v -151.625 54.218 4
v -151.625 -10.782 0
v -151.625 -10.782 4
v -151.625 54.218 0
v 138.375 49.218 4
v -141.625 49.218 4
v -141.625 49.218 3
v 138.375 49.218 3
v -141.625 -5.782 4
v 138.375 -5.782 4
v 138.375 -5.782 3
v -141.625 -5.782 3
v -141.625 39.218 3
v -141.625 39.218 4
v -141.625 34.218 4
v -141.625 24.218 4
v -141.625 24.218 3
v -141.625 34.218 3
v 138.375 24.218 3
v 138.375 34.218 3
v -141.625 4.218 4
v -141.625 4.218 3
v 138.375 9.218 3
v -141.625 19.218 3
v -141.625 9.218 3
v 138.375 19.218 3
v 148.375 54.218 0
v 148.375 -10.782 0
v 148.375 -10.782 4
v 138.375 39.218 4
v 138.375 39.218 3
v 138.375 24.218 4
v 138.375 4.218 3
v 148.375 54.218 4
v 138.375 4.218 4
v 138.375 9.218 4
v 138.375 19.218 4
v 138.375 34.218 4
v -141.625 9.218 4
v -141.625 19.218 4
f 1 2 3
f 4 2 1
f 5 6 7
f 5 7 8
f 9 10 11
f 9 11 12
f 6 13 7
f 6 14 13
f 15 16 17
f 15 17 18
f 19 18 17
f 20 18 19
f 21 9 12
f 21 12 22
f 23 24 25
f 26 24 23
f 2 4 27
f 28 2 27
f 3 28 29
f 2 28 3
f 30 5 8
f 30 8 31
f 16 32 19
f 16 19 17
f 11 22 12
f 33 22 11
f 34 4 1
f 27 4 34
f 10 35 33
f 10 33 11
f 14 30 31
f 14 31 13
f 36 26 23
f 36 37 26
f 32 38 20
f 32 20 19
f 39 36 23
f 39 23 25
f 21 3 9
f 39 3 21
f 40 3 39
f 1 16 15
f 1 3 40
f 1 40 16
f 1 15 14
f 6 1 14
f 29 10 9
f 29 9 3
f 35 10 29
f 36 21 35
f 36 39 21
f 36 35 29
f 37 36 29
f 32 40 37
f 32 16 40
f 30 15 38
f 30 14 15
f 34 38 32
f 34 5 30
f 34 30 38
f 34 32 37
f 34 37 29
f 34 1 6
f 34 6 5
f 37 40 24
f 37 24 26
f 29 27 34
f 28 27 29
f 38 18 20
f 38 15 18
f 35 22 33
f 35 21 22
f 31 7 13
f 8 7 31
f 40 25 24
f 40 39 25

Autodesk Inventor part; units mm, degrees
ref_plane "YZ Plane" through (0, 0, 0) normal (1, 0, 0) x (0, 1, 0)
ref_plane "XZ Plane" through (0, 0, 0) normal (0, 1, 0) x (-1, 0, 0)
ref_plane "XY Plane" through (0, 0, 0) normal (0, 0, 1) x (1, 0, 0)
sketch "Esquisse1" plane through (0, 0, 0) normal (0, 0, 1) x (1, 0, 0)
  line L0 (-151.6254, 54.2183) -> (148.3746, 54.2183)
  line L1 (148.3746, 54.2183) -> (148.3746, -10.7817)
  line L2 (148.3746, -10.7817) -> (-151.6254, -10.7817)
  line L3 (-151.6254, -10.7817) -> (-151.6254, 54.2183)
  point P0 (0, 0)
  dimension "d0" = 300
  dimension "d1" = 65
extrude "Extrusion1" add sketch "Esquisse1" along normal blind 4
sketch "Esquisse2" plane through (0, 0, 4) normal (0, 0, 1) x (1, 0, 0)
  line L0 (-141.6254, 49.2183) -> (138.3746, 49.2183)
  line L1 (138.3746, 49.2183) -> (138.3746, 39.2183)
  line L2 (138.3746, 39.2183) -> (-141.6254, 39.2183)
  line L3 (-141.6254, 39.2183) -> (-141.6254, 49.2183)
  line L4 (-141.6254, 34.2183) -> (138.3746, 34.2183)
  line L5 (138.3746, 34.2183) -> (138.3746, 24.2183)
  line L6 (138.3746, 24.2183) -> (-141.6254, 24.2183)
  line L7 (-141.6254, 24.2183) -> (-141.6254, 34.2183)
  line L8 (-141.6254, 19.2183) -> (138.3746, 19.2183)
  line L9 (138.3746, 19.2183) -> (138.3746, 9.2183)
  line L10 (138.3746, 9.2183) -> (-141.6254, 9.2183)
  line L11 (-141.6254, 9.2183) -> (-141.6254, 19.2183)
  line L12 (-141.6254, 4.2183) -> (138.3746, 4.2183)
  line L13 (138.3746, 4.2183) -> (138.3746, -5.7817)
  line L14 (138.3746, -5.7817) -> (-141.6254, -5.7817)
  line L15 (-141.6254, -5.7817) -> (-141.6254, 4.2183)
  line L16 (148.3746, 54.2183) -> (-151.6254, 54.2183) projected
  line L17 (148.3746, -10.7817) -> (148.3746, 54.2183) projected
  point P0 (0, 0)
  dimension "d4" = 5
  dimension "d5" = 10
  dimension "d6" = 5
  dimension "d7" = 10
  dimension "d8" = 5
  dimension "d9" = 10
  dimension "d10" = 5
  dimension "d11" = 10
  dimension "d12" = 280
  dimension "d13" = 10
extrude "Extrusion2" cut sketch "Esquisse2" against normal blind 1
